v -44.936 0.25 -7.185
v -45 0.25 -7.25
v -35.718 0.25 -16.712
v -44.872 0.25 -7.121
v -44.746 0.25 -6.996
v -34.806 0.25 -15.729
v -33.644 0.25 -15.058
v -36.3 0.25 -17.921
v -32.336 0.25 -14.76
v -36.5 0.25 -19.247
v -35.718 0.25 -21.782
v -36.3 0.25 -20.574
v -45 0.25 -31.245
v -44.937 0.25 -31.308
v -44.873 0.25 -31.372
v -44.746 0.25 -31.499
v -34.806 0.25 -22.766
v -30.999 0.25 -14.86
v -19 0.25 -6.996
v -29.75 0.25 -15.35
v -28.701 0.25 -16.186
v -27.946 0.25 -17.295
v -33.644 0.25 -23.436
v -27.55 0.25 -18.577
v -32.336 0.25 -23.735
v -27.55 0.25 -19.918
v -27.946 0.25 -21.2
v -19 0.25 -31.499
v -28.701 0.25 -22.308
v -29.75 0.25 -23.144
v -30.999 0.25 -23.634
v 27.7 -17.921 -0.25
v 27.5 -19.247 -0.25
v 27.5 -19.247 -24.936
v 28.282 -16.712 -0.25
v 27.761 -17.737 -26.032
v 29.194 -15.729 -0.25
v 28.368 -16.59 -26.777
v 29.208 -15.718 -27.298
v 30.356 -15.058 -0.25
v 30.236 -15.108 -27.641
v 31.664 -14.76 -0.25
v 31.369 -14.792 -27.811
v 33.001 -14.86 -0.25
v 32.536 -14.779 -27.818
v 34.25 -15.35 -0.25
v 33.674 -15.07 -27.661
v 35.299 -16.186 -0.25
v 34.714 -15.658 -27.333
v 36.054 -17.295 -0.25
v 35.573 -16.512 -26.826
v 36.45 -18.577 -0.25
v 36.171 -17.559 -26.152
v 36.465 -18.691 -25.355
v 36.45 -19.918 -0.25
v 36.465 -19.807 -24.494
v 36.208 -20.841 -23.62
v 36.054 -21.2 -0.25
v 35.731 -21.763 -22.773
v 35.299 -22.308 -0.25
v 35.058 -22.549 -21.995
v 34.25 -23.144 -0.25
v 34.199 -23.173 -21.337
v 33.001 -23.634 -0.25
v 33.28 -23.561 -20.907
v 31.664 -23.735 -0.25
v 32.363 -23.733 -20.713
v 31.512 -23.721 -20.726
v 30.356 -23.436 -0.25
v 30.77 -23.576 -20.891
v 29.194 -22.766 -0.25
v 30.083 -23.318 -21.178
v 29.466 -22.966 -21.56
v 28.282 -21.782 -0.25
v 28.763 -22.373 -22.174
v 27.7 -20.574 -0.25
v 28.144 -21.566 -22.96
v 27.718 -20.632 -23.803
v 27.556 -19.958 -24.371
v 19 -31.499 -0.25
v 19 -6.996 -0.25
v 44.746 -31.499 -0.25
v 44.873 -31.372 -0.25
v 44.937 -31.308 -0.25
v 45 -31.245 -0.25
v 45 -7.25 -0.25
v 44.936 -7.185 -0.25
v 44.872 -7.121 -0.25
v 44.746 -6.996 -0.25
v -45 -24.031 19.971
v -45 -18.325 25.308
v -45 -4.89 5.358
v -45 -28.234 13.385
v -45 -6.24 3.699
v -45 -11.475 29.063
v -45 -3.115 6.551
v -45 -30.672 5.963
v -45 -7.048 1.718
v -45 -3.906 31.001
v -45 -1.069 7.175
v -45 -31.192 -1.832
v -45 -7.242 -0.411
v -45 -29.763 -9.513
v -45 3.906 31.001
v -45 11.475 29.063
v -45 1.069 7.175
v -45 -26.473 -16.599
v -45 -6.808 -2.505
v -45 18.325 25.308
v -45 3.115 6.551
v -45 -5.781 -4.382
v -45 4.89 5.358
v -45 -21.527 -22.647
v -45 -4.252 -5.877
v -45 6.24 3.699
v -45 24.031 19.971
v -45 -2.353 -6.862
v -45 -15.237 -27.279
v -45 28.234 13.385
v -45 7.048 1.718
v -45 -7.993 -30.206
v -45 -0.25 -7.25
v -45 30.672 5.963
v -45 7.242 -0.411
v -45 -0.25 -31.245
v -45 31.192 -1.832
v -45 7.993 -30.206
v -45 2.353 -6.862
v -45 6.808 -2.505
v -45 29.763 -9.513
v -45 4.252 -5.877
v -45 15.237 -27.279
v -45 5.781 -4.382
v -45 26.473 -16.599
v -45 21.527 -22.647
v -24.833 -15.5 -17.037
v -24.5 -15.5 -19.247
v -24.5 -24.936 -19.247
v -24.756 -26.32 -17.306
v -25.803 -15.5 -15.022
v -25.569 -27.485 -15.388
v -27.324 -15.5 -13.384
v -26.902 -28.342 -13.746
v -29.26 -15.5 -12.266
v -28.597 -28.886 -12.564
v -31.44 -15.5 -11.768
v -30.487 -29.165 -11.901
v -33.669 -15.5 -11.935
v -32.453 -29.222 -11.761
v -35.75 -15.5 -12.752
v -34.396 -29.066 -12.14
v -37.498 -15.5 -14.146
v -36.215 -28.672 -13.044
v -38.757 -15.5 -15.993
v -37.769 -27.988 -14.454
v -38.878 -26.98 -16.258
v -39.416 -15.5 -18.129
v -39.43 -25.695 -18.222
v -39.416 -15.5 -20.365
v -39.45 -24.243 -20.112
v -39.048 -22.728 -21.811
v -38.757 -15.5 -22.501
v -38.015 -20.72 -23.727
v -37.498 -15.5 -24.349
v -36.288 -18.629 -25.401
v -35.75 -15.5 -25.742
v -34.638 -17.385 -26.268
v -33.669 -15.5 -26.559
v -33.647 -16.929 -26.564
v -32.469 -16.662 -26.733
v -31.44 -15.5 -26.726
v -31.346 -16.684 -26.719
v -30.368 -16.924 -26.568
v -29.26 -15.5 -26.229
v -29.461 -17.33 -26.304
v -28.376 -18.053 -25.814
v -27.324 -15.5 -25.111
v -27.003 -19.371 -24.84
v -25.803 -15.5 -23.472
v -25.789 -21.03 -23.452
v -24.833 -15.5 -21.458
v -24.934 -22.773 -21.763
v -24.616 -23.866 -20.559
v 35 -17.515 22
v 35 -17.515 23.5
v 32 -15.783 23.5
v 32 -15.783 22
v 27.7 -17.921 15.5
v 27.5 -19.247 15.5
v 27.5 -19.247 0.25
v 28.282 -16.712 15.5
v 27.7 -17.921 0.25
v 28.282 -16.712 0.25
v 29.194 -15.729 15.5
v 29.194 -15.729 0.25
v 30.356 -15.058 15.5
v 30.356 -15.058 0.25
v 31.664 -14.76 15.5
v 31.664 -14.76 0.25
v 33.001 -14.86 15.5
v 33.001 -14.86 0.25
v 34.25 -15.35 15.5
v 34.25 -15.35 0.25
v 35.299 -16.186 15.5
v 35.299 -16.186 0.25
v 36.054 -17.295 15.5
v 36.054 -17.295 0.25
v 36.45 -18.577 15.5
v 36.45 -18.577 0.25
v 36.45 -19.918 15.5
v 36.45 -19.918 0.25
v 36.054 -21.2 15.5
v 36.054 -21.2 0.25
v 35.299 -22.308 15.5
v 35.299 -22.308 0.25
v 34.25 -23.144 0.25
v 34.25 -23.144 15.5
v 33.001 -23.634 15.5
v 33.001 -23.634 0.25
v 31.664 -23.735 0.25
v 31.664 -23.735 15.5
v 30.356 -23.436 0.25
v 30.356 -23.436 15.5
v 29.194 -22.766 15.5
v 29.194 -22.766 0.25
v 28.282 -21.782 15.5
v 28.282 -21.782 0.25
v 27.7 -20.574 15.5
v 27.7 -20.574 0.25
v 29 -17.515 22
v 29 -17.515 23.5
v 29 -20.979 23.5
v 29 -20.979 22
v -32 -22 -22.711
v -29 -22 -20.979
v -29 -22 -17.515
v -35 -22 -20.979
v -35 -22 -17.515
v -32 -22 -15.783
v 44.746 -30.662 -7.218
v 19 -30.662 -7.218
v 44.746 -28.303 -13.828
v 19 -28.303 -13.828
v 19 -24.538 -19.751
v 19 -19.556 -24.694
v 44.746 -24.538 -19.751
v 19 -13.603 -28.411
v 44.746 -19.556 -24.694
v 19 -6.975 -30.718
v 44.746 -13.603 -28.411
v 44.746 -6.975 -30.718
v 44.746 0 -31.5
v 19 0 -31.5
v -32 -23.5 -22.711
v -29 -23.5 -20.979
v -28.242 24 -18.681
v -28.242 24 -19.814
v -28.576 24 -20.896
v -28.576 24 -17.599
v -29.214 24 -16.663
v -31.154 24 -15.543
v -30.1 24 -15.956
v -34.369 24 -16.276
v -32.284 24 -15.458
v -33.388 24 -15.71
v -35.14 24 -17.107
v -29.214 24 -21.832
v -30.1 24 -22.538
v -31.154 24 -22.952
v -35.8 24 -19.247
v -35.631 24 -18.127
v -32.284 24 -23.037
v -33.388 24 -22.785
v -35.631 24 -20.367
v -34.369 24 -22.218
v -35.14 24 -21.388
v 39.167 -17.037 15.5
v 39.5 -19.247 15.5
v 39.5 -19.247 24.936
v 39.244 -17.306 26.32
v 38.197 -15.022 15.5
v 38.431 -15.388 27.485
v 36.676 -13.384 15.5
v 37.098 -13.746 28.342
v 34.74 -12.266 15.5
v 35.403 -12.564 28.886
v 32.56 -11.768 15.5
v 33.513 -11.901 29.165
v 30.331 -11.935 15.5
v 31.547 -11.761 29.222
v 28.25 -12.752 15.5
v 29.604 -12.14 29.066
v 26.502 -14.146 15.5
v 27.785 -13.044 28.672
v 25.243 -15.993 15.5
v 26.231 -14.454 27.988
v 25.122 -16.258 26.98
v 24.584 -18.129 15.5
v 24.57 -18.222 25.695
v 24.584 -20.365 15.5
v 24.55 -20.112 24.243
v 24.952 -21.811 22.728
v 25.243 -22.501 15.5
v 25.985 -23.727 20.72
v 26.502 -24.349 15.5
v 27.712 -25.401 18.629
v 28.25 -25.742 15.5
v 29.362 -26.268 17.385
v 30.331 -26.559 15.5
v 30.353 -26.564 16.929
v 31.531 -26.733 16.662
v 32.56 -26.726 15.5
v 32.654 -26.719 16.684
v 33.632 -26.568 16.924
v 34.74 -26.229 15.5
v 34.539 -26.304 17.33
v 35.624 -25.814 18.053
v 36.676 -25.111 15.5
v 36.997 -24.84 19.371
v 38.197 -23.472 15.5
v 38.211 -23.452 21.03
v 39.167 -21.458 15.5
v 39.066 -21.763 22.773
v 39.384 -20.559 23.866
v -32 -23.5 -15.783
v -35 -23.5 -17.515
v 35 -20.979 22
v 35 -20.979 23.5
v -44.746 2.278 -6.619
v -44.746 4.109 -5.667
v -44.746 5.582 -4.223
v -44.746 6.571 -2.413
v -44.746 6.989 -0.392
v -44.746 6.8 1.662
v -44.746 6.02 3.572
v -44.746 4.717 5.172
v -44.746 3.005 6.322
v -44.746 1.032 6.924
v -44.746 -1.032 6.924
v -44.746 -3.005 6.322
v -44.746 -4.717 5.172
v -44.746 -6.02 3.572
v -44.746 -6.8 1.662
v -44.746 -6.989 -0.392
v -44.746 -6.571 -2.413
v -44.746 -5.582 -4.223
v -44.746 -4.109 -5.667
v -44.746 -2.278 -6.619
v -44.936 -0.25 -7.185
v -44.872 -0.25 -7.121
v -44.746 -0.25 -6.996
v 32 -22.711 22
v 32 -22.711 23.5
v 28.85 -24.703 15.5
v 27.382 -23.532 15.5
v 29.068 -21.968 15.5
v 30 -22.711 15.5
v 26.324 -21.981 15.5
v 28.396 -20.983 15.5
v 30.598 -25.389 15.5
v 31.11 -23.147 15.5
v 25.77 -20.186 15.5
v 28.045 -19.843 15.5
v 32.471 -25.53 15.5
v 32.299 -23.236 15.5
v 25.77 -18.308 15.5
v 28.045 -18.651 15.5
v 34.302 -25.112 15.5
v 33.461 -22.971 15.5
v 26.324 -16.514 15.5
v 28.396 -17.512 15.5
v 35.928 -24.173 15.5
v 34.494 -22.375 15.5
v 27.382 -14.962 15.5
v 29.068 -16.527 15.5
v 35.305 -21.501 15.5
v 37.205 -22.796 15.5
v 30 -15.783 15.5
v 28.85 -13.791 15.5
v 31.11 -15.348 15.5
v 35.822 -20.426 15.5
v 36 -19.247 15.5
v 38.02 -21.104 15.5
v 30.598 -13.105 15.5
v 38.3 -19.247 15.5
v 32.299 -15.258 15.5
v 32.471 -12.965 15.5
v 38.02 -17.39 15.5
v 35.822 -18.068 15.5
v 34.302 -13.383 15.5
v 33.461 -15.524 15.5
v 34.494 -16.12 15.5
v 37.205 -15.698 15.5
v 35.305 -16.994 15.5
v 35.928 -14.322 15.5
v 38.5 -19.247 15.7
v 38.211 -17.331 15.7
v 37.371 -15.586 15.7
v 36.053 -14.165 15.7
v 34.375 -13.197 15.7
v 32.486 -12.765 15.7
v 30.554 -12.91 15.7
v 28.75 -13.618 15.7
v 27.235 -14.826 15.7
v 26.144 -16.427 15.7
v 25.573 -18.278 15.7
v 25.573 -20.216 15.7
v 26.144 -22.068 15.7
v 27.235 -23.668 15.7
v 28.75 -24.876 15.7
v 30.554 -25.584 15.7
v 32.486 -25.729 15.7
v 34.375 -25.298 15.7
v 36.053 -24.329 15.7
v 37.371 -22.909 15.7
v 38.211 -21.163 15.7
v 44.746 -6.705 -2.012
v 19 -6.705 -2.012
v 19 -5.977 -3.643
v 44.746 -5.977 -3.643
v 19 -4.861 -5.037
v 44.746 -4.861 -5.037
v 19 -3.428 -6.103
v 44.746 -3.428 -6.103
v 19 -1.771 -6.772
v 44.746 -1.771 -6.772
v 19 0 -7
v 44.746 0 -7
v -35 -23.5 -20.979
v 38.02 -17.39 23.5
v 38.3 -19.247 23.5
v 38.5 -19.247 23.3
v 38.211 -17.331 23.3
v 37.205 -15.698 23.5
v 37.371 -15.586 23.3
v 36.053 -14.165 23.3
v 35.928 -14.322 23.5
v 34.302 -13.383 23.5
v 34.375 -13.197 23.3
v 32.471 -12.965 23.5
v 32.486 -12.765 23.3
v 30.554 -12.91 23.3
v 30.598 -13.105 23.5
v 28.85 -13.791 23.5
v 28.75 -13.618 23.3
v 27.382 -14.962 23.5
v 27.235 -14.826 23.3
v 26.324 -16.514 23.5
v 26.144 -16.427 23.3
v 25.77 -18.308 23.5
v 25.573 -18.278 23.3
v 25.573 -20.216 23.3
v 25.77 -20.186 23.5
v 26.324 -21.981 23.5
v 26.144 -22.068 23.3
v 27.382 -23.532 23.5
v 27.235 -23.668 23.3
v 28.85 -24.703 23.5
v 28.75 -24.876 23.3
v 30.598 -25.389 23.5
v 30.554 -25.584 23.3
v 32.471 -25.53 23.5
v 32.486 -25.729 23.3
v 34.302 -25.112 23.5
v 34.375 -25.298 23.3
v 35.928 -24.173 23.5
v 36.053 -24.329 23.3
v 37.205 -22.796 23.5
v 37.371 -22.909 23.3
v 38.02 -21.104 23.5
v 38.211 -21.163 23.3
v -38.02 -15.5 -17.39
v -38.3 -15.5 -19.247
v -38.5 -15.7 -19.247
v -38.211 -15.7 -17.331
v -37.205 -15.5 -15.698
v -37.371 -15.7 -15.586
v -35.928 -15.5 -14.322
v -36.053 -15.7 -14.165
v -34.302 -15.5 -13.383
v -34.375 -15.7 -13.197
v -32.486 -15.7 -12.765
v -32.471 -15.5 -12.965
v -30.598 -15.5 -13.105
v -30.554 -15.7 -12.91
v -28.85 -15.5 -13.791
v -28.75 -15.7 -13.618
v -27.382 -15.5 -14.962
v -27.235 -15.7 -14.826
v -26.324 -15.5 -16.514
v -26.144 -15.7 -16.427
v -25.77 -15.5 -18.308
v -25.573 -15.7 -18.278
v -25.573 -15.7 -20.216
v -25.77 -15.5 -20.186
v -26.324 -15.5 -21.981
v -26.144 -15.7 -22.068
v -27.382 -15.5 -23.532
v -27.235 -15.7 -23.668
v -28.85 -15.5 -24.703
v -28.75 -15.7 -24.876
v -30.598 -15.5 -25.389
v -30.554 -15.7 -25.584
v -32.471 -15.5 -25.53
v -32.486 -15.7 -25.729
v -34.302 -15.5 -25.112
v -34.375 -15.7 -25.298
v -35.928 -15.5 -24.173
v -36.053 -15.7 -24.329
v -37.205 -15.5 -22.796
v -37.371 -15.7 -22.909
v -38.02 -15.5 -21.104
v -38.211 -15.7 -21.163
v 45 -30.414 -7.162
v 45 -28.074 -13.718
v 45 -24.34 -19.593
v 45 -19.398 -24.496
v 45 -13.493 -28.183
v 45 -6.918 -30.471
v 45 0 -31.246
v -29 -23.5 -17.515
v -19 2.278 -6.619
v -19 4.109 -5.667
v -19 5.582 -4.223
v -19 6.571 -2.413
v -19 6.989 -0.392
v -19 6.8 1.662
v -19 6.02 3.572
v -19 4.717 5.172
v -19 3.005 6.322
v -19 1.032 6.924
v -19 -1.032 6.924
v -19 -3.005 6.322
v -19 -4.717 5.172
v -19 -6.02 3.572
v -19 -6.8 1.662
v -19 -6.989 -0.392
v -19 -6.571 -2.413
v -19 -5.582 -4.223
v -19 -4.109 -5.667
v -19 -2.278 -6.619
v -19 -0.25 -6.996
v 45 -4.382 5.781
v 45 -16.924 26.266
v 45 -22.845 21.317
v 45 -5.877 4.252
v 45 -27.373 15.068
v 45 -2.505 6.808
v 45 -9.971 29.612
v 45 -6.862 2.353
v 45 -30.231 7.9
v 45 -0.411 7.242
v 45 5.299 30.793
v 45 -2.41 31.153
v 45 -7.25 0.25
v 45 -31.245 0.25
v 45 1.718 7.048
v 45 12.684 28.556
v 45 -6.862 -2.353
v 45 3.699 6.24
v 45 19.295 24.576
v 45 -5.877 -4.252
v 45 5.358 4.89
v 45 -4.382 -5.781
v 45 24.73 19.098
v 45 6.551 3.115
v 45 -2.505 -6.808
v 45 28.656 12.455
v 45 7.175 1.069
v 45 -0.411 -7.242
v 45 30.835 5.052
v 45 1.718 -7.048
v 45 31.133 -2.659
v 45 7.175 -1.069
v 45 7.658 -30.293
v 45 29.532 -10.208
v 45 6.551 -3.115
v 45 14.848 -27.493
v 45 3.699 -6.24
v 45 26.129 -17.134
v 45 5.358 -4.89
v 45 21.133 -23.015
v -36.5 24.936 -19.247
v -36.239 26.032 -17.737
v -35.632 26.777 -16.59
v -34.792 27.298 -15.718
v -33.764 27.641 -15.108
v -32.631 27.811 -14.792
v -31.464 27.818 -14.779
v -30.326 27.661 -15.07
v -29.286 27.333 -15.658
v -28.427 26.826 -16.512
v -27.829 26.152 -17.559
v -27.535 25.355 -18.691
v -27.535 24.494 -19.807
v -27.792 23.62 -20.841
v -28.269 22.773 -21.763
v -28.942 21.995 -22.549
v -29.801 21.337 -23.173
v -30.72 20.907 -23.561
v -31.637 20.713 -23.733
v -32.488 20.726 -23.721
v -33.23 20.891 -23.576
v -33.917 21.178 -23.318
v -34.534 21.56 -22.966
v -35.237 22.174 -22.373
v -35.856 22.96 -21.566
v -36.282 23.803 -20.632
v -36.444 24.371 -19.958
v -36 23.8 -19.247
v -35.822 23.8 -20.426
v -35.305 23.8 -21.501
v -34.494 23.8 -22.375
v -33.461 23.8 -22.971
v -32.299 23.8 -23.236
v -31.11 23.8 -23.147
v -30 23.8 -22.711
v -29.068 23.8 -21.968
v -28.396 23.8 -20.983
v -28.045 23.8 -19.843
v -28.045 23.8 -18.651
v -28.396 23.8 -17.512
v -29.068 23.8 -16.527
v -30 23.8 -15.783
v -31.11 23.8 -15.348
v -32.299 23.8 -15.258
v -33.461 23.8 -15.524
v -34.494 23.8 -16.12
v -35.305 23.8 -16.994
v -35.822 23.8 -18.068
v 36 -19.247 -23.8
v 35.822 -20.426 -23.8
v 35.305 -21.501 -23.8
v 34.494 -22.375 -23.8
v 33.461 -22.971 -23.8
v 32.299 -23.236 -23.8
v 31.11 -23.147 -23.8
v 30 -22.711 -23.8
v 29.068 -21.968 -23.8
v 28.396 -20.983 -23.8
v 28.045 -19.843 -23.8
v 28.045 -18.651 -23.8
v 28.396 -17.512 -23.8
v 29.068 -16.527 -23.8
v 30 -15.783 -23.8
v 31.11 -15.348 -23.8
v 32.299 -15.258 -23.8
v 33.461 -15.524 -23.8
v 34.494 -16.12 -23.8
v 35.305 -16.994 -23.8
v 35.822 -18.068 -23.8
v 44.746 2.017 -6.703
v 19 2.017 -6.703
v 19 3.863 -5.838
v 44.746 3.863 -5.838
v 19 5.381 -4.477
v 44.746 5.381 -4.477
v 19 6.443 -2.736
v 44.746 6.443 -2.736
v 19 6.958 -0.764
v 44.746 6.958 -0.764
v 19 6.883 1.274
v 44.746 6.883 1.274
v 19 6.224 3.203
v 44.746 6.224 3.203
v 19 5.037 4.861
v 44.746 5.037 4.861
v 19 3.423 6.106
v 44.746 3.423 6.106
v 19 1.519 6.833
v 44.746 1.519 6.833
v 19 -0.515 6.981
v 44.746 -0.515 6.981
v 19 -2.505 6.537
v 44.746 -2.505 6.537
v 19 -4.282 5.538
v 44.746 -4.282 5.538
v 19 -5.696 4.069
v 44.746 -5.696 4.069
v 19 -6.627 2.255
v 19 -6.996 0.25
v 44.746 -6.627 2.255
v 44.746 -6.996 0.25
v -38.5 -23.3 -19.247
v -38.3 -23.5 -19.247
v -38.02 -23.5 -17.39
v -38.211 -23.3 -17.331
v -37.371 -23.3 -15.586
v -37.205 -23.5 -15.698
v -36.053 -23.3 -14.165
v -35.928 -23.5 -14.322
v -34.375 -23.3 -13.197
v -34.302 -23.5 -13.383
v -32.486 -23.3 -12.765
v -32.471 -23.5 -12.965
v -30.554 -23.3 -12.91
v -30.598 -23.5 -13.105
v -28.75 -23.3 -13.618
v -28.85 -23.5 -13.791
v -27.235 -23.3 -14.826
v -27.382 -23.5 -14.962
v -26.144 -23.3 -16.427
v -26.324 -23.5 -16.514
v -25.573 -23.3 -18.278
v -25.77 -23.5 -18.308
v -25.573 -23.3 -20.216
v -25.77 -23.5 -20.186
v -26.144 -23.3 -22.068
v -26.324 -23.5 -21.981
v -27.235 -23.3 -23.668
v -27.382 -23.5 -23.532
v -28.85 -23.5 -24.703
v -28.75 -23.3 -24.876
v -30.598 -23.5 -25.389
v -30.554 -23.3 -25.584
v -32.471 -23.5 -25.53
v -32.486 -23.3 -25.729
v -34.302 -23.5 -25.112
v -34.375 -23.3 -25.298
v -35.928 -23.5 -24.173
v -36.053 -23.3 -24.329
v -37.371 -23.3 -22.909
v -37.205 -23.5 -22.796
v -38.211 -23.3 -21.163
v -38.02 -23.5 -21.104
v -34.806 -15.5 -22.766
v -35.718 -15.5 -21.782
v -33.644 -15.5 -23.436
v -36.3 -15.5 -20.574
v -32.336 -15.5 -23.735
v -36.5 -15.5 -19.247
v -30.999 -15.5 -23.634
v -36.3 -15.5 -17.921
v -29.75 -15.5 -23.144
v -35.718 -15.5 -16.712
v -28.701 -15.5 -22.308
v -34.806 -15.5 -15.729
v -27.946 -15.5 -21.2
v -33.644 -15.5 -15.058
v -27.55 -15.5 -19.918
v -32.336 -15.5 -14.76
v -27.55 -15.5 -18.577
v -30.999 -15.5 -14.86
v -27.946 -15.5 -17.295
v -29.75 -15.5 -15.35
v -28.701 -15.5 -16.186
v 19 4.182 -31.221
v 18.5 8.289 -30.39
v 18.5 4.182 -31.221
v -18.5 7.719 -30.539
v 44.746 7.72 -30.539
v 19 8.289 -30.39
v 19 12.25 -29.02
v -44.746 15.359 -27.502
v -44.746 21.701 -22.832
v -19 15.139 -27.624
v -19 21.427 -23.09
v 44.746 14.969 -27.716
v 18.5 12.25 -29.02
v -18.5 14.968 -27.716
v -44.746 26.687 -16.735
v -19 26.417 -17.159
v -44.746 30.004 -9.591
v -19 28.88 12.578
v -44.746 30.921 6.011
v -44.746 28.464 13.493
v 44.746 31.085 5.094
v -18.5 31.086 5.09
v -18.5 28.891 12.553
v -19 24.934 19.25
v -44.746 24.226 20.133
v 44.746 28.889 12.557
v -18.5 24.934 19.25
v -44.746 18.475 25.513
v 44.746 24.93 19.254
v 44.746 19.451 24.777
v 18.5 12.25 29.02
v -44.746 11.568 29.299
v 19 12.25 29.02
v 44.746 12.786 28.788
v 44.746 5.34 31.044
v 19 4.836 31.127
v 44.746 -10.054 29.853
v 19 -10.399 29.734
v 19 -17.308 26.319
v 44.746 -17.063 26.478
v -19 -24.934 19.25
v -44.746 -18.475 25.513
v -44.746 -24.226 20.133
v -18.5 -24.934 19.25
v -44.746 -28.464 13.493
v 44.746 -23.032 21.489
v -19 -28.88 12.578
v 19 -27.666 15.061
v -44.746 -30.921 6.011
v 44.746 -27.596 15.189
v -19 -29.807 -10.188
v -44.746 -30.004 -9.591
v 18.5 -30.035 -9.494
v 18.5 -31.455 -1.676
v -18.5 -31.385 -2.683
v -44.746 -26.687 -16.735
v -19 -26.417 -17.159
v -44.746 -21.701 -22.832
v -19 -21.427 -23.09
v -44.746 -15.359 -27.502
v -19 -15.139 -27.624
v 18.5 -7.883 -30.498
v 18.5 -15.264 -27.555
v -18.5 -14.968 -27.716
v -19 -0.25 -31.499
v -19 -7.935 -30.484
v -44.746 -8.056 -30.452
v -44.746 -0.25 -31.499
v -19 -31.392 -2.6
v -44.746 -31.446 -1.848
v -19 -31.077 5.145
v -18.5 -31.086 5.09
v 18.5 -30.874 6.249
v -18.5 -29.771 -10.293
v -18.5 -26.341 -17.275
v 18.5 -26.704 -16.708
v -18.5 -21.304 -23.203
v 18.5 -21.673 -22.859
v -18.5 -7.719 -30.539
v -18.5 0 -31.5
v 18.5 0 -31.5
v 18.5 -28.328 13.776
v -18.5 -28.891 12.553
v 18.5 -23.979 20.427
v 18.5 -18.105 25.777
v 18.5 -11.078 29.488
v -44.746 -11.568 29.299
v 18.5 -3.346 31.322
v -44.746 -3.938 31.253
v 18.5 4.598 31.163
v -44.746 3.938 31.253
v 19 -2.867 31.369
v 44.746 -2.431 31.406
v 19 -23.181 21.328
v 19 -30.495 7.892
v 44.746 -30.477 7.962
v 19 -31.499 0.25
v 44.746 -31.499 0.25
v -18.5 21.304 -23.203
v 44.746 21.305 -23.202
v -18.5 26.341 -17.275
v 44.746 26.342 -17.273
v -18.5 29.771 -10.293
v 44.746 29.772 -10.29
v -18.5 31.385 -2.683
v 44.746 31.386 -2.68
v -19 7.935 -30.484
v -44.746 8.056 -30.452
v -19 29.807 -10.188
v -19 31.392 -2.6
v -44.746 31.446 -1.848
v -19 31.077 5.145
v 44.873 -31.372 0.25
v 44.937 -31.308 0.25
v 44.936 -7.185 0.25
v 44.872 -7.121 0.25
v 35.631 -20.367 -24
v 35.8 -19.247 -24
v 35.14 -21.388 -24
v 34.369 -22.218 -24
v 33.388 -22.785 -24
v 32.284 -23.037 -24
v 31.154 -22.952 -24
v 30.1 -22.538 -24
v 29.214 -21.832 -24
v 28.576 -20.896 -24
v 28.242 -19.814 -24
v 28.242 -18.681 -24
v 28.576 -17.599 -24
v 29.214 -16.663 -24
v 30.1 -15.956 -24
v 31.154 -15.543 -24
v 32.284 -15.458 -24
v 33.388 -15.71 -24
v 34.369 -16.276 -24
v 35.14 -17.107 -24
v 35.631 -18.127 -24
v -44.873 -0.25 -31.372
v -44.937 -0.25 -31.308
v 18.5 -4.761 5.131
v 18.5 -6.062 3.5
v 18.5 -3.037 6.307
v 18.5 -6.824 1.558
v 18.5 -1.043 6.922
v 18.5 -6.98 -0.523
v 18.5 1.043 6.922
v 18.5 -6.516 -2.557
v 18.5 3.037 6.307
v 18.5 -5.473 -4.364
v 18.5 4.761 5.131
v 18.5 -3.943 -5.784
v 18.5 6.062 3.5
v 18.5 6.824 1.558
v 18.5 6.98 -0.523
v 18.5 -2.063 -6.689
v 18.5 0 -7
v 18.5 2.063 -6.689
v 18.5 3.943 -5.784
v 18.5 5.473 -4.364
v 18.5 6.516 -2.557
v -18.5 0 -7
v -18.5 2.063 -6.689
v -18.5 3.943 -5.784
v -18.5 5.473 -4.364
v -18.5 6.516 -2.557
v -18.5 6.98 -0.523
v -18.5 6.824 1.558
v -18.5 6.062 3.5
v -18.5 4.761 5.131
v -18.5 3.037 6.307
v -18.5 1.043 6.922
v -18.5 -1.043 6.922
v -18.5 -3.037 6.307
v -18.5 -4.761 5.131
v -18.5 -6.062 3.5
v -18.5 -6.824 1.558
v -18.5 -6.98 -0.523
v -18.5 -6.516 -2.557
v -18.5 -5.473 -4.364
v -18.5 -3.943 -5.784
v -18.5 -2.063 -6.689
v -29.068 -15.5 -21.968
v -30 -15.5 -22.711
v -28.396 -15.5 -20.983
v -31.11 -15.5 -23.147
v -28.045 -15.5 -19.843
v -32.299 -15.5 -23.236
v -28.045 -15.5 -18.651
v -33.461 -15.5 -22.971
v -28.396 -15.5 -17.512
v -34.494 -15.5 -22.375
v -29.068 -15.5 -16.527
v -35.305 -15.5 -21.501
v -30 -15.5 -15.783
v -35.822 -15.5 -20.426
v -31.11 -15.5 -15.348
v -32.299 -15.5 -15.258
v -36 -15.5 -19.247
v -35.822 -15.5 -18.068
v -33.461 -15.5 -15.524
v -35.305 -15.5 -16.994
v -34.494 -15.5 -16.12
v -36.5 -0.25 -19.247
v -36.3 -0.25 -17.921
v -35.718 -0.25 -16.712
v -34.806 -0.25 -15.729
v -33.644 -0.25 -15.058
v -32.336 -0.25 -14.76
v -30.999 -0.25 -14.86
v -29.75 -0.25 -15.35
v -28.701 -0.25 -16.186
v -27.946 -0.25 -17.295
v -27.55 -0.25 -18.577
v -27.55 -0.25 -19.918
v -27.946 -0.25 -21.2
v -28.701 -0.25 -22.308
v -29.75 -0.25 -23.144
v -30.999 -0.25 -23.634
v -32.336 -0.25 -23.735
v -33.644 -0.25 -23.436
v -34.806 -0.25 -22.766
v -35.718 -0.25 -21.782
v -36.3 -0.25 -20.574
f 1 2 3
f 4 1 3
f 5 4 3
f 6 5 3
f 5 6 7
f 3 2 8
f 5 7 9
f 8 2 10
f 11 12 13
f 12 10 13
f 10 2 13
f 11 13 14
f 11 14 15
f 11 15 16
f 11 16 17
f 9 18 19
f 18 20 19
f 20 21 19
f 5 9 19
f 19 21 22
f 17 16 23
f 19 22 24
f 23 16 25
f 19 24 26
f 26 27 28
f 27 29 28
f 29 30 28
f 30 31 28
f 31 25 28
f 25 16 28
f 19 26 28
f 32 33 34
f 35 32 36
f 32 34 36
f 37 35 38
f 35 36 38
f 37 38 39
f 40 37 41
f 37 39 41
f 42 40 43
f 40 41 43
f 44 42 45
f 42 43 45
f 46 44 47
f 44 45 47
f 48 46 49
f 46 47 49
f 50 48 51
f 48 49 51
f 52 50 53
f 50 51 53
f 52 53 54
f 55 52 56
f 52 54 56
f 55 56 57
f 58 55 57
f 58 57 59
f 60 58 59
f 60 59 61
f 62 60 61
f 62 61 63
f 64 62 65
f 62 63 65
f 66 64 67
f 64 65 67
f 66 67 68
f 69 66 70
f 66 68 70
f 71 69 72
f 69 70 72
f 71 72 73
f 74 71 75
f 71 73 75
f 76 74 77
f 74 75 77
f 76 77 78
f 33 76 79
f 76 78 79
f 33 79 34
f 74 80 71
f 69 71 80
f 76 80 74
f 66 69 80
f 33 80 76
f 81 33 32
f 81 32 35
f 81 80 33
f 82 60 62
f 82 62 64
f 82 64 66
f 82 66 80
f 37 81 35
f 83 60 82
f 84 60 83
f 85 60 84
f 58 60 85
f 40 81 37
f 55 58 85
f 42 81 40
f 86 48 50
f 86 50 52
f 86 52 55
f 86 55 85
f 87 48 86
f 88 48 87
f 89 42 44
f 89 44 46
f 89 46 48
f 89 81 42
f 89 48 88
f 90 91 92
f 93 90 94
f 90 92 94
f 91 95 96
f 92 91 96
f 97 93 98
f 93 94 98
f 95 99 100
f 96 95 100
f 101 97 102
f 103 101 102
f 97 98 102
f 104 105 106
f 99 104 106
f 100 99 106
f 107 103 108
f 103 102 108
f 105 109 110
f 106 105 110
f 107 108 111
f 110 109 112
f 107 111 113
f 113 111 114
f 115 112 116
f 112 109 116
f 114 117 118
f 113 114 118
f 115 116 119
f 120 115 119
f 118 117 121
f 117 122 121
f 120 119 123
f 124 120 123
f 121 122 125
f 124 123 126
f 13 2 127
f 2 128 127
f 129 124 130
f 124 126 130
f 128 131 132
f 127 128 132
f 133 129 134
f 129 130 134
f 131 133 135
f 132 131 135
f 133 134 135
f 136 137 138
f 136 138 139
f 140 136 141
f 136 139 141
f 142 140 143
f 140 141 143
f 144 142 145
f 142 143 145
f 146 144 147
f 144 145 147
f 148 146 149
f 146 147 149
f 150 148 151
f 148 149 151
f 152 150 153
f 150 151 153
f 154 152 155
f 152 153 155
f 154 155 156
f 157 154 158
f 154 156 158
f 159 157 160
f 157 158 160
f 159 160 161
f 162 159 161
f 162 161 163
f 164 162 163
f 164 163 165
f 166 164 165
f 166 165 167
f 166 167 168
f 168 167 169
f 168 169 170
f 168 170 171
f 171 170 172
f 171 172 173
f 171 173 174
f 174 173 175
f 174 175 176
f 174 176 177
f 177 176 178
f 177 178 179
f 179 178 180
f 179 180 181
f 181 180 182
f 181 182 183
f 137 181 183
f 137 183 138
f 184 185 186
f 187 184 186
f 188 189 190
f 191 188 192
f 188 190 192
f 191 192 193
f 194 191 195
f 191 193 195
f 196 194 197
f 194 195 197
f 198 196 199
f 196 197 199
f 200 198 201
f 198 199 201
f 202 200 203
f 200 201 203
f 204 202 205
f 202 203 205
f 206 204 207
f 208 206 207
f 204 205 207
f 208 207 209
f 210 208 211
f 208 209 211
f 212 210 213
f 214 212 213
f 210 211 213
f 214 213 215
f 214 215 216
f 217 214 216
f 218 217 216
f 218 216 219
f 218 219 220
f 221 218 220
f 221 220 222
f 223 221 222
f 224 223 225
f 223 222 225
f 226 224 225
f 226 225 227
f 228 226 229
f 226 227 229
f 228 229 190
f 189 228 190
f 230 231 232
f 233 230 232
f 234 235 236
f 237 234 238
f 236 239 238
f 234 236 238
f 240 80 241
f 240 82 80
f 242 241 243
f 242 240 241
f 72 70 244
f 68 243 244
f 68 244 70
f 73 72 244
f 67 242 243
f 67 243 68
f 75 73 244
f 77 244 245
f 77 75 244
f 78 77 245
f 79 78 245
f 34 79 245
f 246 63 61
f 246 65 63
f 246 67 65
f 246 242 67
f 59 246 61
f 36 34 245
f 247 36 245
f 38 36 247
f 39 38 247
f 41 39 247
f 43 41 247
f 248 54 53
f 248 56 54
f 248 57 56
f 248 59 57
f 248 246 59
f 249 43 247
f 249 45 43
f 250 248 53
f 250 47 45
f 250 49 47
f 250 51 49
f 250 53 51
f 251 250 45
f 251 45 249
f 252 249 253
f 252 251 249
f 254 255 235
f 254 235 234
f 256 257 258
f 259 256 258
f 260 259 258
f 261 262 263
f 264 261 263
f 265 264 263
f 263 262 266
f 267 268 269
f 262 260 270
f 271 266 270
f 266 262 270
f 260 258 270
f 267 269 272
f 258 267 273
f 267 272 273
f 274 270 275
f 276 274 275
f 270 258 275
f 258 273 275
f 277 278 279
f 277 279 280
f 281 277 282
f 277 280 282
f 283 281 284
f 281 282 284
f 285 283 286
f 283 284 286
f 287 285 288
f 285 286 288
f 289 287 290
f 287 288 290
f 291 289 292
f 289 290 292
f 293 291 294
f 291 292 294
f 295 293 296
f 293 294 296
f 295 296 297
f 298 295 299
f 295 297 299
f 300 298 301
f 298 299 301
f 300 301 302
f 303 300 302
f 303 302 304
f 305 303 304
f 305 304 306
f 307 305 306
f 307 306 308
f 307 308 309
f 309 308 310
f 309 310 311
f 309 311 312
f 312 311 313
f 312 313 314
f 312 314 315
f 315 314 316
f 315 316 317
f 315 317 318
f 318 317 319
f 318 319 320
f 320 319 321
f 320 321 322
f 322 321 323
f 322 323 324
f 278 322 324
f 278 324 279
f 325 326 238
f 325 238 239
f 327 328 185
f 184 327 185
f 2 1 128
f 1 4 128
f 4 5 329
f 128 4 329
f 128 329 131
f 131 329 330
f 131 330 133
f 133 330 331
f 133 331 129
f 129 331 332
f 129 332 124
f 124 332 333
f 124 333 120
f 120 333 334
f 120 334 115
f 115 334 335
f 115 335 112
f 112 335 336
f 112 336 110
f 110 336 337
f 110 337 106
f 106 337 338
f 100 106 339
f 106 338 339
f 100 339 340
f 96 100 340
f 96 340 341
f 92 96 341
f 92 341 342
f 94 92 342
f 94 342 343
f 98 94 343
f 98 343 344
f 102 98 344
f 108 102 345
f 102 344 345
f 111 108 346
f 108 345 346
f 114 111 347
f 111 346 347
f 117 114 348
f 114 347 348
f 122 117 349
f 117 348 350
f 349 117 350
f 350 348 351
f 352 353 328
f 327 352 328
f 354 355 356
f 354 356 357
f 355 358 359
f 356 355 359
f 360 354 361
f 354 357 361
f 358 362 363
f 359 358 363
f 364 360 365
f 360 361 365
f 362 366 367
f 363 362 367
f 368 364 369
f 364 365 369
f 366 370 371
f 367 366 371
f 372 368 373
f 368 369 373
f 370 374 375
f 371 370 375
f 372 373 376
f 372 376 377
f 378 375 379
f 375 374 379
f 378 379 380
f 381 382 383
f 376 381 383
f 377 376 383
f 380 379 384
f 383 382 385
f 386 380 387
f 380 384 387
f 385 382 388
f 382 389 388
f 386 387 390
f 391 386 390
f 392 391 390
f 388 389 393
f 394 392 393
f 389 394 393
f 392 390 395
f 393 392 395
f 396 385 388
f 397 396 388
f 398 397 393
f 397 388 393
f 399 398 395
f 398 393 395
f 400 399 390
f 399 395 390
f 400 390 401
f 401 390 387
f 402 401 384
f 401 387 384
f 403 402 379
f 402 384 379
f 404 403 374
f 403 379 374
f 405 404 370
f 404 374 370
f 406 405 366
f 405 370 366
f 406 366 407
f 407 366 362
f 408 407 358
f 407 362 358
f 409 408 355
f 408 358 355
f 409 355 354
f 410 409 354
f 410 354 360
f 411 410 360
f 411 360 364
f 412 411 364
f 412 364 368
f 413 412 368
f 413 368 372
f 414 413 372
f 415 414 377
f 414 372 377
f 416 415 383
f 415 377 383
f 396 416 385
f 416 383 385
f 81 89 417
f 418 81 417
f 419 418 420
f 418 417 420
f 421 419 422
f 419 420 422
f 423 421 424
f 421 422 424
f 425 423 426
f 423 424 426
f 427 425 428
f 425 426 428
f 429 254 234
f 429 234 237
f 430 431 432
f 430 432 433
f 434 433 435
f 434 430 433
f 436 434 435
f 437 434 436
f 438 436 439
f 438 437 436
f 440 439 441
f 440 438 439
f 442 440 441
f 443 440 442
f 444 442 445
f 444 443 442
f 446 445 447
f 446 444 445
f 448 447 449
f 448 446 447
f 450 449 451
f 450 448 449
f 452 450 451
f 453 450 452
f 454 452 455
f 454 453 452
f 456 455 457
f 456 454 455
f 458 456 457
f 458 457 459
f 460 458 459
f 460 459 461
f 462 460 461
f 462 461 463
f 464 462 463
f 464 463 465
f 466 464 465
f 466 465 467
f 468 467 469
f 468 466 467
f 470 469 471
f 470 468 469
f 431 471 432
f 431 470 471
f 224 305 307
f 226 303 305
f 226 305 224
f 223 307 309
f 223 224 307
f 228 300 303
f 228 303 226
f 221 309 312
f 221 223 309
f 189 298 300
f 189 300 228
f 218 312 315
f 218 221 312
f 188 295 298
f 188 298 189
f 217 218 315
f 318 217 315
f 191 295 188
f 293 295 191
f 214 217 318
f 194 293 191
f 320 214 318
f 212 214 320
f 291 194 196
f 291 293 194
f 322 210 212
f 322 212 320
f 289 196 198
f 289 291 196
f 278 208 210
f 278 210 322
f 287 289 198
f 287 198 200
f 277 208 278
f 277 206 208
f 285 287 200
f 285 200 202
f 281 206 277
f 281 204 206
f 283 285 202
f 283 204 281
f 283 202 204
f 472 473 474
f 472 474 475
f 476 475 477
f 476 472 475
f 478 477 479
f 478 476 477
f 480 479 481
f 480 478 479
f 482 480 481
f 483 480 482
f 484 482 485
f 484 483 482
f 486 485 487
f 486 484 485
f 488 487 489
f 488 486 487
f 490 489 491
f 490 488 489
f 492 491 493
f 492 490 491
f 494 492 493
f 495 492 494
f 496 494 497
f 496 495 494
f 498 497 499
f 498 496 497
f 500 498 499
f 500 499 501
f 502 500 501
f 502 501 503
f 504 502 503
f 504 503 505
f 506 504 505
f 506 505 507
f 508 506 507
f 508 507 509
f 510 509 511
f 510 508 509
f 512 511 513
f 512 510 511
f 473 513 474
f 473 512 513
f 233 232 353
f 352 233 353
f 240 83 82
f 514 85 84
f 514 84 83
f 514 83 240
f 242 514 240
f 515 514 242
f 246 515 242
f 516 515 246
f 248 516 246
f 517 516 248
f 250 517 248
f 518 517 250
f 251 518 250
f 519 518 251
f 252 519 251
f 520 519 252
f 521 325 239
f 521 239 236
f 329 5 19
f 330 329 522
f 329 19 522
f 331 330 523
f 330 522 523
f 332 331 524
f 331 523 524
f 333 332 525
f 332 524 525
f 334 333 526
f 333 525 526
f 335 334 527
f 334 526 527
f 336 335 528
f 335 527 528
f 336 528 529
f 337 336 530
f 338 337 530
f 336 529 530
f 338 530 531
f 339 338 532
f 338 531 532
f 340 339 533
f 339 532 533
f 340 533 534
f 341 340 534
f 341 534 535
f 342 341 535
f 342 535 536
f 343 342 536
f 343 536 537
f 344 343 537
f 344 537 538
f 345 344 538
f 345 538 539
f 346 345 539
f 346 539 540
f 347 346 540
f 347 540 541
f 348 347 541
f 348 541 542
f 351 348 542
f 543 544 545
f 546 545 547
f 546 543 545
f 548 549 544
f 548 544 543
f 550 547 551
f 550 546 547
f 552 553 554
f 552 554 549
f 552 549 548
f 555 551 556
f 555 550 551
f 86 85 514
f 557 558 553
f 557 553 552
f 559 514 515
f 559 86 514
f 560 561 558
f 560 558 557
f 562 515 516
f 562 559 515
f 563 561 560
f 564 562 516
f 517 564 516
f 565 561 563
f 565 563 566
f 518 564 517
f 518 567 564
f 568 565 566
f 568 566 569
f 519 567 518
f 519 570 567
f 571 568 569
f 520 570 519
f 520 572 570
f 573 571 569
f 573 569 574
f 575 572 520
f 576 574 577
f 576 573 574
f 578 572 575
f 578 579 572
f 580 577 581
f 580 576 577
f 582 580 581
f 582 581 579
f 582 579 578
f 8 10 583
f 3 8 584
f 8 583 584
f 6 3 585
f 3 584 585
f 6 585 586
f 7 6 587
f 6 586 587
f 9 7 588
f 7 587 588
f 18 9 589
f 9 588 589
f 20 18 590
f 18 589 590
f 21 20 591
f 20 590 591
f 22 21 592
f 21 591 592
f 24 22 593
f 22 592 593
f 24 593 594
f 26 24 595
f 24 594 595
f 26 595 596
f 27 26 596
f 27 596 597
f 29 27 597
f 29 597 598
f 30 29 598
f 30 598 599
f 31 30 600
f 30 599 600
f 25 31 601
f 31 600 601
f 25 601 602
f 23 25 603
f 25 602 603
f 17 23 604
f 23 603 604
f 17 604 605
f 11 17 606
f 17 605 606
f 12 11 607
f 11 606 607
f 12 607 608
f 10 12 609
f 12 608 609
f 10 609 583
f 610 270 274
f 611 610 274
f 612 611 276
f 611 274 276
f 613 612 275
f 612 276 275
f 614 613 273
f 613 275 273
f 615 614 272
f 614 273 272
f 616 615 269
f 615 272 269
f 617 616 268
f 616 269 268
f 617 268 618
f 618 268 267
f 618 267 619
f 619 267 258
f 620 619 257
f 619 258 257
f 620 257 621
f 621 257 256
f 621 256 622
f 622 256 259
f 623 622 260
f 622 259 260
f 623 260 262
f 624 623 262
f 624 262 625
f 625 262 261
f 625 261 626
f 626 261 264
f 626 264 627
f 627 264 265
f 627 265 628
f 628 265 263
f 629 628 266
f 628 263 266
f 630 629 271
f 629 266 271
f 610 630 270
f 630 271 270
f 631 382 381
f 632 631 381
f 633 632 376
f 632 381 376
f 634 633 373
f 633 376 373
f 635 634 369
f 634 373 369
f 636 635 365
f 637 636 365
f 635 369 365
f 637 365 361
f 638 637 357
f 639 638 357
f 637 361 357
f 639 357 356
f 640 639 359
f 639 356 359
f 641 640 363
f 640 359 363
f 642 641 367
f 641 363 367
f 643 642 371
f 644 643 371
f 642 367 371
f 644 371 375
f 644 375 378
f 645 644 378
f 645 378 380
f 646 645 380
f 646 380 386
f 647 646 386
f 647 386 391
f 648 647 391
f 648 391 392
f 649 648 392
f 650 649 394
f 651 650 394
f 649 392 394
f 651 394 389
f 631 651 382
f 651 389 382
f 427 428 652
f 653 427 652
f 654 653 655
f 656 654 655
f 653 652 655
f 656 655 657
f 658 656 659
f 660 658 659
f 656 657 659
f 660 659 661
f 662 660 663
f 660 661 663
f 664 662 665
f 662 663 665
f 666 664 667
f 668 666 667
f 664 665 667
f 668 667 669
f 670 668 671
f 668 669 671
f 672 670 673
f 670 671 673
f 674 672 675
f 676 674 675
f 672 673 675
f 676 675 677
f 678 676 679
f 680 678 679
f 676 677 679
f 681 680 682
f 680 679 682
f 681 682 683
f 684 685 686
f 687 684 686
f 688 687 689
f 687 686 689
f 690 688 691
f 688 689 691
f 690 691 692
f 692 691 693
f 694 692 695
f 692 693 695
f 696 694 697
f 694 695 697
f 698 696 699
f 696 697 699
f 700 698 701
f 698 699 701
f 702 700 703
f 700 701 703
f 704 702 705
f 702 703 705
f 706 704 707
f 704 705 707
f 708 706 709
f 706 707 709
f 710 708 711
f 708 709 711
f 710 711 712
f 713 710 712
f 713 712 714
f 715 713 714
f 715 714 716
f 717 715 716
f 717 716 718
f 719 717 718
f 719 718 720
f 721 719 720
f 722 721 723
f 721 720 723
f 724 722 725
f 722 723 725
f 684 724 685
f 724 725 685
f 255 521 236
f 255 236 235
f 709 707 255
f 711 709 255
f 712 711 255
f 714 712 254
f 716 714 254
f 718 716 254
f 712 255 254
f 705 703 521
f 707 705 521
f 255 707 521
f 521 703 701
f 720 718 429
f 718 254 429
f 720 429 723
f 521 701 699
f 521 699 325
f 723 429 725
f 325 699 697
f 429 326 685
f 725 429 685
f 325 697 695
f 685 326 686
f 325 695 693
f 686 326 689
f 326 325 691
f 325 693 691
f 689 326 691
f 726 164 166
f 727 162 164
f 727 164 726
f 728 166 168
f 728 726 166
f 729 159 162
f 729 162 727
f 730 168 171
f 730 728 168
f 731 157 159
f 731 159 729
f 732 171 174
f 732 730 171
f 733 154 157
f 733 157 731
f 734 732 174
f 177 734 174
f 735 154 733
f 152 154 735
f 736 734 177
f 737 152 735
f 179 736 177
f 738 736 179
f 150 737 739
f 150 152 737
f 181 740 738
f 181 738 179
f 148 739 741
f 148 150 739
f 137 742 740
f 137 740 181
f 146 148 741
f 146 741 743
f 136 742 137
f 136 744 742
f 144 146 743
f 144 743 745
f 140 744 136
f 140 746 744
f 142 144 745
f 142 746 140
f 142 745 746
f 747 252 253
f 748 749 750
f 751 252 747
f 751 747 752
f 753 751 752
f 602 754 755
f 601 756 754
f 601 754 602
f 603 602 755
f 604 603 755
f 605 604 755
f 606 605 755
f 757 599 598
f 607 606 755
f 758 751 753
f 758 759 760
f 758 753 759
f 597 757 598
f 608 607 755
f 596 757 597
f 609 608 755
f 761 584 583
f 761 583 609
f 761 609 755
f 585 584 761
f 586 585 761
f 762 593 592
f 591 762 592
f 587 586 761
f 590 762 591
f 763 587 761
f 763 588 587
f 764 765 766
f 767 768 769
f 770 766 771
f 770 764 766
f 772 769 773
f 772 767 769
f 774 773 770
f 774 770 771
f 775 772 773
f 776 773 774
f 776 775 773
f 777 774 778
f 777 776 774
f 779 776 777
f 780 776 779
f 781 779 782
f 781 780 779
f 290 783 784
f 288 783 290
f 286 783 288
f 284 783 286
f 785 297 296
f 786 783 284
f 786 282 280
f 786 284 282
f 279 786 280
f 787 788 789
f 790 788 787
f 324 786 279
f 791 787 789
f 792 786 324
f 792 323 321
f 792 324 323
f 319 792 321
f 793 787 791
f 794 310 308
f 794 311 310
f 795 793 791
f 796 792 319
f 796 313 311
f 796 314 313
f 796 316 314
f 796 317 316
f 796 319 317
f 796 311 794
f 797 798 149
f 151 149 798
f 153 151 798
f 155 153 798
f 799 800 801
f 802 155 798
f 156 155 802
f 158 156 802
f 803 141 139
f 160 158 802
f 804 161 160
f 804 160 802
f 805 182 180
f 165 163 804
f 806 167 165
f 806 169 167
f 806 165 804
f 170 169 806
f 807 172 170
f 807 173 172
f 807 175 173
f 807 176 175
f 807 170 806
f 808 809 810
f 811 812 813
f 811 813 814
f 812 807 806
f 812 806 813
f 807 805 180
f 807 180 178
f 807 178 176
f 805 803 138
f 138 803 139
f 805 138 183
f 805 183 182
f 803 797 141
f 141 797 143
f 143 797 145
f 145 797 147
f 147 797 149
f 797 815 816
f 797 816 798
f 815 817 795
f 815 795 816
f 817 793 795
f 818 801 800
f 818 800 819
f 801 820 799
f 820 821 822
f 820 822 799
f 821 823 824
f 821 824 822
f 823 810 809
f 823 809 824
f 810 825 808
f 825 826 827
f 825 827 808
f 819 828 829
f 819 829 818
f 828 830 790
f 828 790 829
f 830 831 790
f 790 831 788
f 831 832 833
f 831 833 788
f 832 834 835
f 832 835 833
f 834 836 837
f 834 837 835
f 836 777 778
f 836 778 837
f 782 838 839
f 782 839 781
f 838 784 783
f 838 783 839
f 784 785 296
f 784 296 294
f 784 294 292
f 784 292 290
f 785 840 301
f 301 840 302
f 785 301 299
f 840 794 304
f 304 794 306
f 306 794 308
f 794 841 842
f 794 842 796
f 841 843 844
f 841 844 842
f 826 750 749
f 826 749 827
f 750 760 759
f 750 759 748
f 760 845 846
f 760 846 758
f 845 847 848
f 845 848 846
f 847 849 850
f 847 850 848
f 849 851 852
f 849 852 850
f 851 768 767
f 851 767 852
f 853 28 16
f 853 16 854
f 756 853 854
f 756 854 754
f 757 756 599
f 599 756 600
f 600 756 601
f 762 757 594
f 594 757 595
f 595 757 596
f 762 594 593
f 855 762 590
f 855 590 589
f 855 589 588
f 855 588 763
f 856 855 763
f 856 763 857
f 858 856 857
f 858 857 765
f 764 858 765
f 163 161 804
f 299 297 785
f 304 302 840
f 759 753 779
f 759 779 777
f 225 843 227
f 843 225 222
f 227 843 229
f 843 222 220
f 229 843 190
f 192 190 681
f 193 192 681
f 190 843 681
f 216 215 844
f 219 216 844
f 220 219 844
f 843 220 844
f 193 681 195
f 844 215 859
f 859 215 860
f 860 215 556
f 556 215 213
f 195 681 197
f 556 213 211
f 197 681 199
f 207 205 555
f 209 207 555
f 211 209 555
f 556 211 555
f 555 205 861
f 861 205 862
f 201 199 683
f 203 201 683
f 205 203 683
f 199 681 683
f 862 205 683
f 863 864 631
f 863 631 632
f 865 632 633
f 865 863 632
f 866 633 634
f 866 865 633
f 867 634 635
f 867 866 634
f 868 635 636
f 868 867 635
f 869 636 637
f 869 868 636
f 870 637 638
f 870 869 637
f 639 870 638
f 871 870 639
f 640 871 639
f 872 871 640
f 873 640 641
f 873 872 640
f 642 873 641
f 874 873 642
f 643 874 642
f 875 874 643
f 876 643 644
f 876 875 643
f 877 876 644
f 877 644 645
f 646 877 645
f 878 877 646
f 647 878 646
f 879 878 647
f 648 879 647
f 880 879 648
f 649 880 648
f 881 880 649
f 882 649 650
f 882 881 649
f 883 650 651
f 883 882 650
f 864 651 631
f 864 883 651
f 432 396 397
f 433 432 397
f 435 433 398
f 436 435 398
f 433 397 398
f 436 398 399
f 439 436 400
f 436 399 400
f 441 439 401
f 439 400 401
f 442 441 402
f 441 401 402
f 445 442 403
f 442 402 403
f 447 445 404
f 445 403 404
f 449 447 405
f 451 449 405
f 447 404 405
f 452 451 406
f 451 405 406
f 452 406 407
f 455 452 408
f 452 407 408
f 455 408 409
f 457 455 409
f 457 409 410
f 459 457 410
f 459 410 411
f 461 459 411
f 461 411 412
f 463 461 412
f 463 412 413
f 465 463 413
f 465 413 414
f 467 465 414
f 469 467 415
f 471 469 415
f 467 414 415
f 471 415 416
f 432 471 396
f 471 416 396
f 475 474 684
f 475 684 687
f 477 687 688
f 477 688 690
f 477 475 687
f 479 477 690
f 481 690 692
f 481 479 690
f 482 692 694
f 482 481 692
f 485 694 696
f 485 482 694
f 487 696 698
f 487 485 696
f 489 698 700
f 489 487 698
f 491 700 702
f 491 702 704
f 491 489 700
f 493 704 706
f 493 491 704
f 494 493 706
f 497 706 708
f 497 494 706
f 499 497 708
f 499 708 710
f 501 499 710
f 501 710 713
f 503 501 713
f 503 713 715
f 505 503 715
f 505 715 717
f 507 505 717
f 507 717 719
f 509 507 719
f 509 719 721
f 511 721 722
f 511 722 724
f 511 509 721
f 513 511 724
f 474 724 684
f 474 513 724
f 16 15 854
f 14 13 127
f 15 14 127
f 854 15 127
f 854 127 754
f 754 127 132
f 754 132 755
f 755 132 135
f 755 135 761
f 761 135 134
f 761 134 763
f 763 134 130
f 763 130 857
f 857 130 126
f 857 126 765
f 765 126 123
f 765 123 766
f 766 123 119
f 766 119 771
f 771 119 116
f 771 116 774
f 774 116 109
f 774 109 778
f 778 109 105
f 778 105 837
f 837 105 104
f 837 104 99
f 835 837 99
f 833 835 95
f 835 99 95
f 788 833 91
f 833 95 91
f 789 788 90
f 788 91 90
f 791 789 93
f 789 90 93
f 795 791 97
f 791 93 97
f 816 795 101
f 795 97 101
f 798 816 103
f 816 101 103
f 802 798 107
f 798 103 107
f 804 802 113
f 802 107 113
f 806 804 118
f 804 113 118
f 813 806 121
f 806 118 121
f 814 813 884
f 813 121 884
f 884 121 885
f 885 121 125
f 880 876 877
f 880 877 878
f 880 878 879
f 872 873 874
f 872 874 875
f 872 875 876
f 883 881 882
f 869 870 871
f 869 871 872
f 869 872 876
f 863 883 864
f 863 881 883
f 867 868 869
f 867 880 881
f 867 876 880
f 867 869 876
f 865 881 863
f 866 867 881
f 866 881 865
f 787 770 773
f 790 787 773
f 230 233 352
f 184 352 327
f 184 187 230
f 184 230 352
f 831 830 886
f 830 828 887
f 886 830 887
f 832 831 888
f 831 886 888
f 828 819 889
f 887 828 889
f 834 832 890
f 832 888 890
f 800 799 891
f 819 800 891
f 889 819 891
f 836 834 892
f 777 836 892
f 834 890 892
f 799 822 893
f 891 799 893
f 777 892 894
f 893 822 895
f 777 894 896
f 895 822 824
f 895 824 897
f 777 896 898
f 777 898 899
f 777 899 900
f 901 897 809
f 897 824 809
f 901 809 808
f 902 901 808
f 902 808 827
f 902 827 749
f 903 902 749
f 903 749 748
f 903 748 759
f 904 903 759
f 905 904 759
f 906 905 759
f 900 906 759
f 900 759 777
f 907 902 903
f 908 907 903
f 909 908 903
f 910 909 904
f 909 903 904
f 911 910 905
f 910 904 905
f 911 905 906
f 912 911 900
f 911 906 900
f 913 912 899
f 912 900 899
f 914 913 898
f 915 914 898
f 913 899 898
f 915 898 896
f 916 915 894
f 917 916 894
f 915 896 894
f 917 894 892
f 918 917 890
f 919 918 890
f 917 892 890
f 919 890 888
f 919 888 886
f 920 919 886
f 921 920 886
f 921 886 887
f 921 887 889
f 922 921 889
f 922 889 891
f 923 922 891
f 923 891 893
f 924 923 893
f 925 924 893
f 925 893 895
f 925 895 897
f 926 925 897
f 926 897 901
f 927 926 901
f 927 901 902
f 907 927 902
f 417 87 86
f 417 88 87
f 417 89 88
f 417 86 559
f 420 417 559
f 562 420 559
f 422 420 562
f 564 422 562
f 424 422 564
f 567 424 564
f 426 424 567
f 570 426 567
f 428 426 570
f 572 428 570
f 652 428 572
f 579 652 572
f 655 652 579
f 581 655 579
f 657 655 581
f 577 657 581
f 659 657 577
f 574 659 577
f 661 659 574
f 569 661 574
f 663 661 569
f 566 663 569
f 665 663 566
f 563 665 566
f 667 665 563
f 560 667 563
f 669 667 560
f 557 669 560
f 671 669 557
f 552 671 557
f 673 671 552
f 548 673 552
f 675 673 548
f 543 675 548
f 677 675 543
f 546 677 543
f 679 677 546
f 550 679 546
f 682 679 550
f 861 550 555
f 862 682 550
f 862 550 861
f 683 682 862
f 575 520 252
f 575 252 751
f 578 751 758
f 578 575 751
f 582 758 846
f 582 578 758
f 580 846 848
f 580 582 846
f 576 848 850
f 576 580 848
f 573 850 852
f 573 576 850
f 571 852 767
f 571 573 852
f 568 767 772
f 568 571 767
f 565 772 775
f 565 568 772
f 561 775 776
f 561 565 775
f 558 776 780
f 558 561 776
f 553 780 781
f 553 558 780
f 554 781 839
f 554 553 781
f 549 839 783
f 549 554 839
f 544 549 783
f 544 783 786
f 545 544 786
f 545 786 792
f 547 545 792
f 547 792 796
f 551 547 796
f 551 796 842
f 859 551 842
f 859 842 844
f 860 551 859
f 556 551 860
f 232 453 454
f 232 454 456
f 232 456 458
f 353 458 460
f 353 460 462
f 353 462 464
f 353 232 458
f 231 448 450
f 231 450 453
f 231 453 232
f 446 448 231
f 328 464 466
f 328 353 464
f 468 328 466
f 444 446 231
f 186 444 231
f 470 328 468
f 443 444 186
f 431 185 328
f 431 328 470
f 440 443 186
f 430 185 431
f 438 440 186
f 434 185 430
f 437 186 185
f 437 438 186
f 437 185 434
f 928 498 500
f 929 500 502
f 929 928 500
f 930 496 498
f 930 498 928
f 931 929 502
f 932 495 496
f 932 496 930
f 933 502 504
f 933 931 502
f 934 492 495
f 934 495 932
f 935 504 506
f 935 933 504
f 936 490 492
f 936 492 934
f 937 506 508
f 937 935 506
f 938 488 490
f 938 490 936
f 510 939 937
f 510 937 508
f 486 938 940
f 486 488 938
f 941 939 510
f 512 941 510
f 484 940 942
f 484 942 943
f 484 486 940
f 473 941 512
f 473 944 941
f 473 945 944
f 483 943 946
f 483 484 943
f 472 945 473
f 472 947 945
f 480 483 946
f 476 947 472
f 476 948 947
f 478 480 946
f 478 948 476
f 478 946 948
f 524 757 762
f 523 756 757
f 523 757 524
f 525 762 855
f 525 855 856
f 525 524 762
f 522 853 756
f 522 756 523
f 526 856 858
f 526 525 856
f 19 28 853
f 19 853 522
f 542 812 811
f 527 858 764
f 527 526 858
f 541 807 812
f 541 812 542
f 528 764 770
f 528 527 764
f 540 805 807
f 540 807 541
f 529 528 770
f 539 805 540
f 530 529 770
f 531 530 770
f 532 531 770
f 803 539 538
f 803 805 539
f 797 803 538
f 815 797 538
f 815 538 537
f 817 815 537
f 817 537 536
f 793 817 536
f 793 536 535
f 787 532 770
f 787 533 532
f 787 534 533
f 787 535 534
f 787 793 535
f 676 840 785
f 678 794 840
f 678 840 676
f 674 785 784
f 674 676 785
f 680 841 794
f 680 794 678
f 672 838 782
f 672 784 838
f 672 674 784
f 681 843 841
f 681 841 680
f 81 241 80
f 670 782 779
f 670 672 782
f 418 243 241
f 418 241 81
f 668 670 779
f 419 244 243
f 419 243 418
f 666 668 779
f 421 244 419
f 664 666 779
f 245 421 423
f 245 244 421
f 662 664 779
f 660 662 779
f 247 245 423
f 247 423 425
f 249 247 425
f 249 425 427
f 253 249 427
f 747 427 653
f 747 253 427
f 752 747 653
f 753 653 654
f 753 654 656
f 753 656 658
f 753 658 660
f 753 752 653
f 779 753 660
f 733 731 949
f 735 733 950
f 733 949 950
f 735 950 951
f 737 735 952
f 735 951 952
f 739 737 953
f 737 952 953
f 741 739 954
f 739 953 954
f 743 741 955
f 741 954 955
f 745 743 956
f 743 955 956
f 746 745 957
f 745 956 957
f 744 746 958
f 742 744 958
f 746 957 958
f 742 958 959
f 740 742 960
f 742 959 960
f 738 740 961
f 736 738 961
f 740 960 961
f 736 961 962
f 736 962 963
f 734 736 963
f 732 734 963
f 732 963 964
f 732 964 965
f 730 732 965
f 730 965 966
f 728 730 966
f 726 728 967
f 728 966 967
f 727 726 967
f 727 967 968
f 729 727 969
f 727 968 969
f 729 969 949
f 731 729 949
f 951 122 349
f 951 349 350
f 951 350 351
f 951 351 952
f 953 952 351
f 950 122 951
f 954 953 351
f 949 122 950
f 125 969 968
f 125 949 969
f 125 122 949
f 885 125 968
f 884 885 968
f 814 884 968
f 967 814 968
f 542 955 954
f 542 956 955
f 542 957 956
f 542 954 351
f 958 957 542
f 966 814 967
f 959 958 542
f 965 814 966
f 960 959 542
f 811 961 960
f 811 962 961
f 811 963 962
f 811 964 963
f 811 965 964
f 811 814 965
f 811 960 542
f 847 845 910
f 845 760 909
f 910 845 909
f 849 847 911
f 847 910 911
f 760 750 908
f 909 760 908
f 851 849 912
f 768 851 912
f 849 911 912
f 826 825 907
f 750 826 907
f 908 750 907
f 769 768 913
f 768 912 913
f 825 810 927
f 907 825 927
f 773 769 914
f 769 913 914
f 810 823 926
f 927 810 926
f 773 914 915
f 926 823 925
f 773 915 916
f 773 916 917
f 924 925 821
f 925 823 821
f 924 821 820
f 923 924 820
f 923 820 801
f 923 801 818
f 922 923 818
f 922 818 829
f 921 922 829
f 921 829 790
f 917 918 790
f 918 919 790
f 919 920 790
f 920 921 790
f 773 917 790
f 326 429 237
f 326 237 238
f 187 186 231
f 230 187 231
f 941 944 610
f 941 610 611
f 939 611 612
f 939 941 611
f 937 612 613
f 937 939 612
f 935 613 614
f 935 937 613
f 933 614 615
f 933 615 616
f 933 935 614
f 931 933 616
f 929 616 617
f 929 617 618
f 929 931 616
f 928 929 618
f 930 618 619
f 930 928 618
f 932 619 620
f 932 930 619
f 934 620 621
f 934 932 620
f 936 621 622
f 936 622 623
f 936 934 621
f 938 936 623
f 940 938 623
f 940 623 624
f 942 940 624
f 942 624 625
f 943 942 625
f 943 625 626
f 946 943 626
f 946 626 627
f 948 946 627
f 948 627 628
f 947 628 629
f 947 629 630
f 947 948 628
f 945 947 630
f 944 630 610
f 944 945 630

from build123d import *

# Parameters (mm, degrees)
SKETCH1_R                      = 31.5
BOSS_EXTRUDE1_DEPTH            = 45
SKETCH2_R                      = 7
CUT_EXTRUDE1_DEPTH             = 91
CHAMFER1_SIZE                  = 0.254
SKETCH4_W                      = 0.5
SKETCH4_H                      = 50.75
CUT_EXTRUDE2_DEPTH             = 64
SKETCH7_W                      = 0.5
SKETCH7_H                      = 43.75
CUT_EXTRUDE3_DEPTH             = 64
SKETCH8_W                      = 26
SKETCH8_H                      = 31.5
CUT_EXTRUDE5_DEPTH             = 0.25
SKETCH13_W                     = 26
SKETCH13_H                     = 31.5
CUT_EXTRUDE6_DEPTH             = 0.25
CBORE_FOR_M8_SHCS1_D           = 9
CBORE_FOR_M8_SHCS1_CBORE_D     = 15
CBORE_FOR_M8_SHCS1_CBORE_DEPTH = 16
CBORE_FOR_M8_SHCS2_D           = 9
CBORE_FOR_M8_SHCS2_CBORE_D     = 15
CBORE_FOR_M8_SHCS2_CBORE_DEPTH = 16
SKETCH16_R                     = 6.5
BOSS_EXTRUDE2_DEPTH            = 8
SKETCH17_R                     = 4
BOSS_EXTRUDE3_DEPTH            = 39.5
CHAMFER2_SIZE                  = 0.2
CUT_EXTRUDE7_DEPTH             = 1.5
CIRPATTERN1_COUNT              = 2
CIRPATTERN1_ANGLE              = 90


with BuildPart() as part:
    # Sketch1 → Boss-Extrude1 (new body, symmetric)
    with BuildSketch(Plane(origin=(0, 0, 0), x_dir=(0, 0, -1), z_dir=(1, 0, 0))):
        Circle(SKETCH1_R)
    extrude(amount=BOSS_EXTRUDE1_DEPTH, both=True)

    # Sketch2 → Cut-Extrude1 (cut, through all)
    with BuildSketch(Plane(origin=(45, 0, 0), x_dir=(0, 0, -1), z_dir=(1, 0, 0))):
        Circle(SKETCH2_R)
    extrude(amount=-CUT_EXTRUDE1_DEPTH, mode=Mode.SUBTRACT)

    # Chamfer1
    chamfer1_edges = [part.edges().sort_by_distance(p)[0] for p in [
        (-45, 0, 31.5),
        (45, 0, 31.5),
        (-45, 0, 7),
        (45, 0, 7),
    ]]
    chamfer(chamfer1_edges, length=CHAMFER1_SIZE)

    # Sketch4 → Cut-Extrude2 (cut, through all)
    with BuildSketch(Plane.XZ.offset(31.5)):
        with Locations((-18.75, -6.125)):
            Rectangle(SKETCH4_W, SKETCH4_H)
    extrude(amount=-CUT_EXTRUDE2_DEPTH, mode=Mode.SUBTRACT)

    # Sketch7 → Cut-Extrude3 (cut, through all)
    with BuildSketch(Plane(origin=(0, 0, -31.5), x_dir=(-1, 0, 0), z_dir=(0, 0, -1))):
        with Locations((-18.75, -9.625)):
            Rectangle(SKETCH7_W, SKETCH7_H)
    extrude(amount=-CUT_EXTRUDE3_DEPTH, mode=Mode.SUBTRACT)

    # Sketch8 → Cut-Extrude5 (cut, symmetric)
    with BuildSketch(Plane(origin=(0, 0, 0), x_dir=(1, 0, 0), z_dir=(0, 1, 0))):
        with Locations((-32, 15.75)):
            Rectangle(SKETCH8_W, SKETCH8_H)
    extrude(amount=CUT_EXTRUDE5_DEPTH, both=True, mode=Mode.SUBTRACT)

    # Sketch13 → Cut-Extrude6 (cut, symmetric)
    with BuildSketch(Plane.XY):
        with Locations((32, -15.75)):
            Rectangle(SKETCH13_W, SKETCH13_H)
    extrude(amount=CUT_EXTRUDE6_DEPTH, both=True, mode=Mode.SUBTRACT)

    # CBORE for M8 SHCS1 (through all)
    with Locations(Plane.XZ.offset(31.5)):
        with Locations((-32, -19.247271105)):
            CounterBoreHole(CBORE_FOR_M8_SHCS1_D / 2, CBORE_FOR_M8_SHCS1_CBORE_D / 2, CBORE_FOR_M8_SHCS1_CBORE_DEPTH)

    # CBORE for M8 SHCS2 (through all)
    with Locations(Plane.XY.offset(31.5)):
        with Locations((32, -19.247271105)):
            CounterBoreHole(CBORE_FOR_M8_SHCS2_D / 2, CBORE_FOR_M8_SHCS2_CBORE_D / 2, CBORE_FOR_M8_SHCS2_CBORE_DEPTH)


with BuildPart() as body_2:
    # Sketch16 → Boss-Extrude2 (new body)
    with BuildSketch(Plane.XY.offset(15.5)):
        with Locations((32, -19.247271105)):
            Circle(SKETCH16_R)
    extrude(amount=BOSS_EXTRUDE2_DEPTH)

    # Sketch17 → Boss-Extrude3 (add)
    with BuildSketch(Plane(origin=(0, 0, 15.5), x_dir=(-1, 0, 0), z_dir=(0, 0, -1))):
        with Locations(Location((-32, -19.247271105, 0), (0, 0, 180))):  # turned: the seam where the file's is
            Circle(SKETCH17_R)
    extrude(amount=BOSS_EXTRUDE3_DEPTH)

    # Chamfer2
    chamfer2_edges = [body_2.edges().sort_by_distance(p)[0] for p in [
        (25.5, -19.247271105, 15.5),
        (25.5, -19.247271105, 23.5),
        (28, -19.247271105, -24),
    ]]
    chamfer(chamfer2_edges, length=CHAMFER2_SIZE)

    # Sketch18 → Cut-Extrude7 (cut)
    with BuildSketch(Plane.XY.offset(23.5)):
        Polygon((32, -22.71137272), (35, -20.979321913), (35, -17.515220298), (32, -15.78316949), (29, -17.515220298), (29, -20.979321913), align=None)
    extrude(amount=-CUT_EXTRUDE7_DEPTH, mode=Mode.SUBTRACT)


with BuildPart() as body_3:
    # Mirror1: mirrored copy
    add(body_2.part.mirror(Plane(origin=(0, 0, 0), x_dir=(0, 0, 1), z_dir=(1, 0, 0))))


with BuildPart() as cirpattern1_1:
    # CirPattern1: pattern copy
    add(body_3.part.rotate(Axis((0, 0, 0), (1, 0, 0)), 1 * CIRPATTERN1_ANGLE / (CIRPATTERN1_COUNT - 1)))


solid = Compound([part.part, body_2.part, cirpattern1_1.part])
